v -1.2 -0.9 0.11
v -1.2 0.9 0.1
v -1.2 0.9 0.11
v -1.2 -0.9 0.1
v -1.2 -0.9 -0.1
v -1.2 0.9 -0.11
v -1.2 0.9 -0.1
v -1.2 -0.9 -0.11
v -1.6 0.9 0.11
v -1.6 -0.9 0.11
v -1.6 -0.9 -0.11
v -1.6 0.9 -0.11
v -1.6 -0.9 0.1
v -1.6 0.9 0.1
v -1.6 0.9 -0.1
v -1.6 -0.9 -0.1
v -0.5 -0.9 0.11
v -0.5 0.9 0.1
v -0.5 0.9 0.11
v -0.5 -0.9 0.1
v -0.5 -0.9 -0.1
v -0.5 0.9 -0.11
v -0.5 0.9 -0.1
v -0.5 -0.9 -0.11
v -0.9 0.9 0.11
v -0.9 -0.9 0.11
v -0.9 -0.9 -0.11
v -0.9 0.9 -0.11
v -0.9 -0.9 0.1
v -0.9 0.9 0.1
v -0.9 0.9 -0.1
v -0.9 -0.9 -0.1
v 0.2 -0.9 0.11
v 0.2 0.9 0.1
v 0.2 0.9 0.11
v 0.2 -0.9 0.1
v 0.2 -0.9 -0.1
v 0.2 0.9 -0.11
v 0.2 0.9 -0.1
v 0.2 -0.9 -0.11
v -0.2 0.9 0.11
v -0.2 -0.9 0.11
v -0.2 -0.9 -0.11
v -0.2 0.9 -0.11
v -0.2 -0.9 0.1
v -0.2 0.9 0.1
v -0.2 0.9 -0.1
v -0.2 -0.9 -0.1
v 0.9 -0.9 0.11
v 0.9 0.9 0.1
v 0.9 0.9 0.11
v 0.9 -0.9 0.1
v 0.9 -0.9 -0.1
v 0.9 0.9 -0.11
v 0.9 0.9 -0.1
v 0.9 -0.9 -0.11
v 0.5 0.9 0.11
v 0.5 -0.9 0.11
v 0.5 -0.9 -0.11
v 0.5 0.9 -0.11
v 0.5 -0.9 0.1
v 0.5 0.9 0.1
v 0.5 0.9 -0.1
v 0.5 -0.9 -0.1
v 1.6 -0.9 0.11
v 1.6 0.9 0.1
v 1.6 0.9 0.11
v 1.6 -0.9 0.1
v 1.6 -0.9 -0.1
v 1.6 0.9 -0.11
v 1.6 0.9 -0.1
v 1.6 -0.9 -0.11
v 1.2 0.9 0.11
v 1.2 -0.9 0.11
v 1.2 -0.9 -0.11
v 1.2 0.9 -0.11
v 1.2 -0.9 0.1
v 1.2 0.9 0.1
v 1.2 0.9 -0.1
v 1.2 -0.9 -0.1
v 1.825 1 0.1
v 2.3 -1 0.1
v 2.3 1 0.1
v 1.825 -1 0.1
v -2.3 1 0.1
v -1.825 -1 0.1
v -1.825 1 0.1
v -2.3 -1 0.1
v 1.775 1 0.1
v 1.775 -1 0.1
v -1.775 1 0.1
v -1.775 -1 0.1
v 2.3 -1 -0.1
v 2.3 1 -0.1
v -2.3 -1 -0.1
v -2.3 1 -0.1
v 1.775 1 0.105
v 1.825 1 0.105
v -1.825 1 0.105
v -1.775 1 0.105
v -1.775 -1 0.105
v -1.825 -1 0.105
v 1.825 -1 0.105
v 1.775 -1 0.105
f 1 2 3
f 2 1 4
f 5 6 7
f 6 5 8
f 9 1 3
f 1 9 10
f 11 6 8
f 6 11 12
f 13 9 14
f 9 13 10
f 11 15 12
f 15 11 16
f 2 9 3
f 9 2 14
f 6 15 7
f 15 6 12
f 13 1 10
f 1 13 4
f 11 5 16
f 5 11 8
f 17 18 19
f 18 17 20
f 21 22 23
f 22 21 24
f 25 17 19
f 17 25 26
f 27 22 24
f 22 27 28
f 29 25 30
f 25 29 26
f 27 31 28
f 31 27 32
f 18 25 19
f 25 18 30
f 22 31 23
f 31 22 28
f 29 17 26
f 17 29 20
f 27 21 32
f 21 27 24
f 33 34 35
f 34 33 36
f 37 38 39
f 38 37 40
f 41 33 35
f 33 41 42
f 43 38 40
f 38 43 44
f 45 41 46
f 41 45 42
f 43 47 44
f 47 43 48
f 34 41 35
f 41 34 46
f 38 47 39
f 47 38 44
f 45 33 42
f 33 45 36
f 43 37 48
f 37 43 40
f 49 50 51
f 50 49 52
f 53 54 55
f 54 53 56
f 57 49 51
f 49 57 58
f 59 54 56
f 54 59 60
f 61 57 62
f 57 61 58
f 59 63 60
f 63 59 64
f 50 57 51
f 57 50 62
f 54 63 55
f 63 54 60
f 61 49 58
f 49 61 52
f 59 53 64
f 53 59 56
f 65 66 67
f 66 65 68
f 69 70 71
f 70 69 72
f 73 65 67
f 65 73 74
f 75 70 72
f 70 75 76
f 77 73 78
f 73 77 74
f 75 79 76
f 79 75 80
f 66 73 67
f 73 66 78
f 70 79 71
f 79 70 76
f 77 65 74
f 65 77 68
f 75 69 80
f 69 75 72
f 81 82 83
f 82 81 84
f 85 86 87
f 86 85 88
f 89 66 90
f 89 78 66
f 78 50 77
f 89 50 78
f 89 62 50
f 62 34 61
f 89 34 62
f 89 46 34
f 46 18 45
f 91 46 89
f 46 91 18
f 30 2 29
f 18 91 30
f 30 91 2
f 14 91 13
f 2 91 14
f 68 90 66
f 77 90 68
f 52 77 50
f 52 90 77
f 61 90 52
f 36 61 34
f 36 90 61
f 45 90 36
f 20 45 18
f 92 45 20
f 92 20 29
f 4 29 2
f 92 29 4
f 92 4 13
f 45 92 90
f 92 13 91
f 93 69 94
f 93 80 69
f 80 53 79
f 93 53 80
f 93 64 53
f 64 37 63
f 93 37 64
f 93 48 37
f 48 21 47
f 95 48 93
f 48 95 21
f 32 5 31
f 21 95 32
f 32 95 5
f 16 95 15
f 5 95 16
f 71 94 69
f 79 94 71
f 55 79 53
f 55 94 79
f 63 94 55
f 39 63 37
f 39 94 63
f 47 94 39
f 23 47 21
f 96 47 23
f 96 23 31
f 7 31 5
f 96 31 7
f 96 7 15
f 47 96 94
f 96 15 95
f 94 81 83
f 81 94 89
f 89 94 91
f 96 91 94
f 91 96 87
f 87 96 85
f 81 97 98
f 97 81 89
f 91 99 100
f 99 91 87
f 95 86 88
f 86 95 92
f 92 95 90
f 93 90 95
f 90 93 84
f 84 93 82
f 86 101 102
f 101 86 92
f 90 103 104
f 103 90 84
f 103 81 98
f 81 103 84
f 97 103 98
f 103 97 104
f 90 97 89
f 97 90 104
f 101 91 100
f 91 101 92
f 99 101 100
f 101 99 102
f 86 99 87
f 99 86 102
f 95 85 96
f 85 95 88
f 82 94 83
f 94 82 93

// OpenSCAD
module Street_05(col ="#3b4747"){
    color(col)
    cube([4,2,0.2], center = true);

    for (i = [-1.4:0.7:1.4] ){
        translate([i,0,0])
        color("white")
        cube([0.4,1.8,0.22], center = true);
    }

    translate([1.8,0,0.10])
    color("white")
    cube([0.05,2,0.01], center = true);

    translate([-1.8,0,0.10])
    color("white")
    cube([0.05,2,0.01], center = true);

    translate([-2.15,0,0.0])
    color("GRAY")
    cube([0.3,2,0.2], center = true);

    translate([2.15,0,0.0])
    color("GRAY")
    cube([0.3,2,0.2], center = true);

}

Street_05();


// Written by Nicolì Angelo (Gengio) 2024: 
// MIT License

//Permission is hereby granted, free of charge, to any person obtaining a copy of this software and associated documentation files (the "Software"), to deal in the Software without restriction, including without limitation the rights to use, copy, modify, merge, publish, distribute, sublicense, and/or sell copies of the Software, and to permit persons to whom the Software is furnished to do so, subject to the following conditions:

//The above copyright notice and this permission notice shall be included in all copies or substantial portions of the Software.

//THE SOFTWARE IS PROVIDED "AS IS", WITHOUT WARRANTY OF ANY KIND, EXPRESS OR IMPLIED, INCLUDING BUT NOT LIMITED TO THE WARRANTIES OF MERCHANTABILITY, FITNESS FOR A PARTICULAR PURPOSE AND NONINFRINGEMENT. IN NO EVENT SHALL THE AUTHORS OR COPYRIGHT HOLDERS BE LIABLE FOR ANY CLAIM, DAMAGES OR OTHER LIABILITY, WHETHER IN AN ACTION OF CONTRACT, TORT OR OTHERWISE, ARISING FROM, OUT OF OR IN CONNECTION WITH THE SOFTWARE OR THE USE OR OTHER DEALINGS IN THE SOFTWARE.
